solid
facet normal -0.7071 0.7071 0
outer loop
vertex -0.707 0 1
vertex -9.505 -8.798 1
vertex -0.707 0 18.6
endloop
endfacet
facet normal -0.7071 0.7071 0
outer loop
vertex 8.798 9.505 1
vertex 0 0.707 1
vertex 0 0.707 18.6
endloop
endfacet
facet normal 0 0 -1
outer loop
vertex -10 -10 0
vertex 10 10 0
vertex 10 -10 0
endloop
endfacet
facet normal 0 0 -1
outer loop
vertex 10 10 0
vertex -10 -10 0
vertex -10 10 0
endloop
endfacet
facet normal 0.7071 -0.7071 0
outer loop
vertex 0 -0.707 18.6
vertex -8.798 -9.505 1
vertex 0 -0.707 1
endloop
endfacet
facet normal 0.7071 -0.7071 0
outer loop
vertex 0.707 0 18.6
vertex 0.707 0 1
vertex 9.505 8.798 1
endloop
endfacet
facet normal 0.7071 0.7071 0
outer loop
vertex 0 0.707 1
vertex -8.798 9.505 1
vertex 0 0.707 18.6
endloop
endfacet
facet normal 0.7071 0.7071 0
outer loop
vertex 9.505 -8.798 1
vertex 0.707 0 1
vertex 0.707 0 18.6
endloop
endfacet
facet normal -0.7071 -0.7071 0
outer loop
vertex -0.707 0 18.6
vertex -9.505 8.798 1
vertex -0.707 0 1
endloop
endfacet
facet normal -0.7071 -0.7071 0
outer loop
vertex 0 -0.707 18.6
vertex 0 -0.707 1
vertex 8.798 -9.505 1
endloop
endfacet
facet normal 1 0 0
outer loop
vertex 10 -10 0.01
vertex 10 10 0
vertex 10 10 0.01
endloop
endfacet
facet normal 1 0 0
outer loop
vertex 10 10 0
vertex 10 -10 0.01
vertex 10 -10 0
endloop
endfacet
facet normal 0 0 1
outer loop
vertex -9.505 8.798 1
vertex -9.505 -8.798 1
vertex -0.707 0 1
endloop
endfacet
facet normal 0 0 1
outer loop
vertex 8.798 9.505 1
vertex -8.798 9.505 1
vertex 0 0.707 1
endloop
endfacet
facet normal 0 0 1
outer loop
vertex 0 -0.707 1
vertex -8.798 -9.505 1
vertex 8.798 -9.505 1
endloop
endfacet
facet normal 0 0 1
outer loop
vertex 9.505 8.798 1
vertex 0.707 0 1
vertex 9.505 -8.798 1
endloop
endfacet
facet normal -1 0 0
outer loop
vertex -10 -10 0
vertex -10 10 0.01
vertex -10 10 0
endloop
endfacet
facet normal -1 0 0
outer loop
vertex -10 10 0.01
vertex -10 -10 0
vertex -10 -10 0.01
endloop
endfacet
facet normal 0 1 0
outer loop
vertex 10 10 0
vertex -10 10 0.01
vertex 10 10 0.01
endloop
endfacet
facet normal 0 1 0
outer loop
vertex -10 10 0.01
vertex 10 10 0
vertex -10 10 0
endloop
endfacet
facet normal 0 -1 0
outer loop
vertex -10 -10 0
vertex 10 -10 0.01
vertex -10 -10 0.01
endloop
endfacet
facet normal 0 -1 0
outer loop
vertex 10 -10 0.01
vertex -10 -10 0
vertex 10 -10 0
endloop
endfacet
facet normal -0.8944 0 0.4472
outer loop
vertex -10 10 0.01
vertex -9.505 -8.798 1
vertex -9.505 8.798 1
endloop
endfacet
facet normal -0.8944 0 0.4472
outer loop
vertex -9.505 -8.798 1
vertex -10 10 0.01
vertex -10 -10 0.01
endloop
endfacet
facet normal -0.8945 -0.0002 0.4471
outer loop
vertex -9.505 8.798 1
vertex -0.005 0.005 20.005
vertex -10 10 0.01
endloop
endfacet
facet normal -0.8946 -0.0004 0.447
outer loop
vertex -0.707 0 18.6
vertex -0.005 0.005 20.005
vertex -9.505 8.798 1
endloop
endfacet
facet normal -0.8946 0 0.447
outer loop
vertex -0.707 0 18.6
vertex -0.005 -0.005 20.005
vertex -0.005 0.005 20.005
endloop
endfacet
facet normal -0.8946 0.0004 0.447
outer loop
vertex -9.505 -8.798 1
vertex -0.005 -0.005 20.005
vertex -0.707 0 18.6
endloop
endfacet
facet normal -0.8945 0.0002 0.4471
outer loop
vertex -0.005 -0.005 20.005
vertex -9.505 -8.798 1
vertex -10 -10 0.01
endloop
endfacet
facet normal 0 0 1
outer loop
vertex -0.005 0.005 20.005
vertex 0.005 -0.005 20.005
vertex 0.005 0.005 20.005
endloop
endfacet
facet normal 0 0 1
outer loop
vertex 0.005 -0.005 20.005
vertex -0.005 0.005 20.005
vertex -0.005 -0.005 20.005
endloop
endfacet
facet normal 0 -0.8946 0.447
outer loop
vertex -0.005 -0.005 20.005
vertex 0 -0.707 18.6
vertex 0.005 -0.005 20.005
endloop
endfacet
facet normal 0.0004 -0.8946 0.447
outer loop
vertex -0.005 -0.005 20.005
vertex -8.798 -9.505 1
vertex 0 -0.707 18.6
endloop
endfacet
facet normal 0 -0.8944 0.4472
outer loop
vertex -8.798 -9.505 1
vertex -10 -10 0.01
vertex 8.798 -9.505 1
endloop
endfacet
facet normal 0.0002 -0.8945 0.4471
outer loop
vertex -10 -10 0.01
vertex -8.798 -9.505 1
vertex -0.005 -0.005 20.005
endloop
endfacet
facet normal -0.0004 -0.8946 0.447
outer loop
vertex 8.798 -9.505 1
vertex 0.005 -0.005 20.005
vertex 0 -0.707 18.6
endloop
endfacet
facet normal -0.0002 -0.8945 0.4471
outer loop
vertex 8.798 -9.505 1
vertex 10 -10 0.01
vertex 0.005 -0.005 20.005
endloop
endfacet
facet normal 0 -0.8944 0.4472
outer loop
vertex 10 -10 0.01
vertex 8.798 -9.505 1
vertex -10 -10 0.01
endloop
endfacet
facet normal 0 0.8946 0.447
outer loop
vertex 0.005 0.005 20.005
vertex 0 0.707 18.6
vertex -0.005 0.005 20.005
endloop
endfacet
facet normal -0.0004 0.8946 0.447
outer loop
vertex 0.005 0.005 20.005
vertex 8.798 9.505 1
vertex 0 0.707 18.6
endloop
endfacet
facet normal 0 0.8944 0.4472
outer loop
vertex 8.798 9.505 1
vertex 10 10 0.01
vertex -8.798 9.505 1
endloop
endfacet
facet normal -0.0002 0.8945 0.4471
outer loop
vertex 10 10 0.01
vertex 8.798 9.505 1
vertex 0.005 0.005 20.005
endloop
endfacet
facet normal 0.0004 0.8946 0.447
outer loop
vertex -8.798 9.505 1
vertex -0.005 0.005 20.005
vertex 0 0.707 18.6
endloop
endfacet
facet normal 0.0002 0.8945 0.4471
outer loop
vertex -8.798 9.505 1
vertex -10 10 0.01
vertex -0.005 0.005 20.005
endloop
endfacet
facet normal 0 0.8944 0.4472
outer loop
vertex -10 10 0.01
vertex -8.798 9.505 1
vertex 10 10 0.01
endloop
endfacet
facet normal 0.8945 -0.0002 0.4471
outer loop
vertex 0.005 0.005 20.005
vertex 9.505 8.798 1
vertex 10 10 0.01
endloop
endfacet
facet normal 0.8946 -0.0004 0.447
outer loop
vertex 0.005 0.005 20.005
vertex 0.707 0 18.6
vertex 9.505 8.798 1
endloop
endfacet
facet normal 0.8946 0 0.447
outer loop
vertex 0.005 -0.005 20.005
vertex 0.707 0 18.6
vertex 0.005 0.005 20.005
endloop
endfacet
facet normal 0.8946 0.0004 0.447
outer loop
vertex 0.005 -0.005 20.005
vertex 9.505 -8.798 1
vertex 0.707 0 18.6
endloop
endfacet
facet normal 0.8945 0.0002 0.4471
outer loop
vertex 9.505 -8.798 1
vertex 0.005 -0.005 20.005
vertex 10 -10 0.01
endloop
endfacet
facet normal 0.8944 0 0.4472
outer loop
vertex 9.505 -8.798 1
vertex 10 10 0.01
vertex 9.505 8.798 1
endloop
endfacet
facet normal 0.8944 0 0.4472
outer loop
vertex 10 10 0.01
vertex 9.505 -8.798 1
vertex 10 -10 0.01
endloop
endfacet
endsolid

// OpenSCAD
eps = 0.01;

module paint_test_cone(base, wall)
{
  module body()
  {
    translate(base/2*[-1, -1, 0])
      cube([base, base, wall]);
    diag = sqrt(2)*base;
    for(r=[45, 45+90])
      rotate([0, 0, r])
        translate([-diag/2, -wall/2, 0])
          cube([diag, wall, diag]);
  }

  module selector()
  {
    hull()
    {
      translate(base/2*[-1, -1, 0])
        cube([base, base, eps]);
      translate([0, 0, base])
        cube(eps*[1,1,1], center=true);
    }
  }

  intersection()
  {
    body();
    selector();
  }
}


paint_test_cone(base=20, wall=1);
